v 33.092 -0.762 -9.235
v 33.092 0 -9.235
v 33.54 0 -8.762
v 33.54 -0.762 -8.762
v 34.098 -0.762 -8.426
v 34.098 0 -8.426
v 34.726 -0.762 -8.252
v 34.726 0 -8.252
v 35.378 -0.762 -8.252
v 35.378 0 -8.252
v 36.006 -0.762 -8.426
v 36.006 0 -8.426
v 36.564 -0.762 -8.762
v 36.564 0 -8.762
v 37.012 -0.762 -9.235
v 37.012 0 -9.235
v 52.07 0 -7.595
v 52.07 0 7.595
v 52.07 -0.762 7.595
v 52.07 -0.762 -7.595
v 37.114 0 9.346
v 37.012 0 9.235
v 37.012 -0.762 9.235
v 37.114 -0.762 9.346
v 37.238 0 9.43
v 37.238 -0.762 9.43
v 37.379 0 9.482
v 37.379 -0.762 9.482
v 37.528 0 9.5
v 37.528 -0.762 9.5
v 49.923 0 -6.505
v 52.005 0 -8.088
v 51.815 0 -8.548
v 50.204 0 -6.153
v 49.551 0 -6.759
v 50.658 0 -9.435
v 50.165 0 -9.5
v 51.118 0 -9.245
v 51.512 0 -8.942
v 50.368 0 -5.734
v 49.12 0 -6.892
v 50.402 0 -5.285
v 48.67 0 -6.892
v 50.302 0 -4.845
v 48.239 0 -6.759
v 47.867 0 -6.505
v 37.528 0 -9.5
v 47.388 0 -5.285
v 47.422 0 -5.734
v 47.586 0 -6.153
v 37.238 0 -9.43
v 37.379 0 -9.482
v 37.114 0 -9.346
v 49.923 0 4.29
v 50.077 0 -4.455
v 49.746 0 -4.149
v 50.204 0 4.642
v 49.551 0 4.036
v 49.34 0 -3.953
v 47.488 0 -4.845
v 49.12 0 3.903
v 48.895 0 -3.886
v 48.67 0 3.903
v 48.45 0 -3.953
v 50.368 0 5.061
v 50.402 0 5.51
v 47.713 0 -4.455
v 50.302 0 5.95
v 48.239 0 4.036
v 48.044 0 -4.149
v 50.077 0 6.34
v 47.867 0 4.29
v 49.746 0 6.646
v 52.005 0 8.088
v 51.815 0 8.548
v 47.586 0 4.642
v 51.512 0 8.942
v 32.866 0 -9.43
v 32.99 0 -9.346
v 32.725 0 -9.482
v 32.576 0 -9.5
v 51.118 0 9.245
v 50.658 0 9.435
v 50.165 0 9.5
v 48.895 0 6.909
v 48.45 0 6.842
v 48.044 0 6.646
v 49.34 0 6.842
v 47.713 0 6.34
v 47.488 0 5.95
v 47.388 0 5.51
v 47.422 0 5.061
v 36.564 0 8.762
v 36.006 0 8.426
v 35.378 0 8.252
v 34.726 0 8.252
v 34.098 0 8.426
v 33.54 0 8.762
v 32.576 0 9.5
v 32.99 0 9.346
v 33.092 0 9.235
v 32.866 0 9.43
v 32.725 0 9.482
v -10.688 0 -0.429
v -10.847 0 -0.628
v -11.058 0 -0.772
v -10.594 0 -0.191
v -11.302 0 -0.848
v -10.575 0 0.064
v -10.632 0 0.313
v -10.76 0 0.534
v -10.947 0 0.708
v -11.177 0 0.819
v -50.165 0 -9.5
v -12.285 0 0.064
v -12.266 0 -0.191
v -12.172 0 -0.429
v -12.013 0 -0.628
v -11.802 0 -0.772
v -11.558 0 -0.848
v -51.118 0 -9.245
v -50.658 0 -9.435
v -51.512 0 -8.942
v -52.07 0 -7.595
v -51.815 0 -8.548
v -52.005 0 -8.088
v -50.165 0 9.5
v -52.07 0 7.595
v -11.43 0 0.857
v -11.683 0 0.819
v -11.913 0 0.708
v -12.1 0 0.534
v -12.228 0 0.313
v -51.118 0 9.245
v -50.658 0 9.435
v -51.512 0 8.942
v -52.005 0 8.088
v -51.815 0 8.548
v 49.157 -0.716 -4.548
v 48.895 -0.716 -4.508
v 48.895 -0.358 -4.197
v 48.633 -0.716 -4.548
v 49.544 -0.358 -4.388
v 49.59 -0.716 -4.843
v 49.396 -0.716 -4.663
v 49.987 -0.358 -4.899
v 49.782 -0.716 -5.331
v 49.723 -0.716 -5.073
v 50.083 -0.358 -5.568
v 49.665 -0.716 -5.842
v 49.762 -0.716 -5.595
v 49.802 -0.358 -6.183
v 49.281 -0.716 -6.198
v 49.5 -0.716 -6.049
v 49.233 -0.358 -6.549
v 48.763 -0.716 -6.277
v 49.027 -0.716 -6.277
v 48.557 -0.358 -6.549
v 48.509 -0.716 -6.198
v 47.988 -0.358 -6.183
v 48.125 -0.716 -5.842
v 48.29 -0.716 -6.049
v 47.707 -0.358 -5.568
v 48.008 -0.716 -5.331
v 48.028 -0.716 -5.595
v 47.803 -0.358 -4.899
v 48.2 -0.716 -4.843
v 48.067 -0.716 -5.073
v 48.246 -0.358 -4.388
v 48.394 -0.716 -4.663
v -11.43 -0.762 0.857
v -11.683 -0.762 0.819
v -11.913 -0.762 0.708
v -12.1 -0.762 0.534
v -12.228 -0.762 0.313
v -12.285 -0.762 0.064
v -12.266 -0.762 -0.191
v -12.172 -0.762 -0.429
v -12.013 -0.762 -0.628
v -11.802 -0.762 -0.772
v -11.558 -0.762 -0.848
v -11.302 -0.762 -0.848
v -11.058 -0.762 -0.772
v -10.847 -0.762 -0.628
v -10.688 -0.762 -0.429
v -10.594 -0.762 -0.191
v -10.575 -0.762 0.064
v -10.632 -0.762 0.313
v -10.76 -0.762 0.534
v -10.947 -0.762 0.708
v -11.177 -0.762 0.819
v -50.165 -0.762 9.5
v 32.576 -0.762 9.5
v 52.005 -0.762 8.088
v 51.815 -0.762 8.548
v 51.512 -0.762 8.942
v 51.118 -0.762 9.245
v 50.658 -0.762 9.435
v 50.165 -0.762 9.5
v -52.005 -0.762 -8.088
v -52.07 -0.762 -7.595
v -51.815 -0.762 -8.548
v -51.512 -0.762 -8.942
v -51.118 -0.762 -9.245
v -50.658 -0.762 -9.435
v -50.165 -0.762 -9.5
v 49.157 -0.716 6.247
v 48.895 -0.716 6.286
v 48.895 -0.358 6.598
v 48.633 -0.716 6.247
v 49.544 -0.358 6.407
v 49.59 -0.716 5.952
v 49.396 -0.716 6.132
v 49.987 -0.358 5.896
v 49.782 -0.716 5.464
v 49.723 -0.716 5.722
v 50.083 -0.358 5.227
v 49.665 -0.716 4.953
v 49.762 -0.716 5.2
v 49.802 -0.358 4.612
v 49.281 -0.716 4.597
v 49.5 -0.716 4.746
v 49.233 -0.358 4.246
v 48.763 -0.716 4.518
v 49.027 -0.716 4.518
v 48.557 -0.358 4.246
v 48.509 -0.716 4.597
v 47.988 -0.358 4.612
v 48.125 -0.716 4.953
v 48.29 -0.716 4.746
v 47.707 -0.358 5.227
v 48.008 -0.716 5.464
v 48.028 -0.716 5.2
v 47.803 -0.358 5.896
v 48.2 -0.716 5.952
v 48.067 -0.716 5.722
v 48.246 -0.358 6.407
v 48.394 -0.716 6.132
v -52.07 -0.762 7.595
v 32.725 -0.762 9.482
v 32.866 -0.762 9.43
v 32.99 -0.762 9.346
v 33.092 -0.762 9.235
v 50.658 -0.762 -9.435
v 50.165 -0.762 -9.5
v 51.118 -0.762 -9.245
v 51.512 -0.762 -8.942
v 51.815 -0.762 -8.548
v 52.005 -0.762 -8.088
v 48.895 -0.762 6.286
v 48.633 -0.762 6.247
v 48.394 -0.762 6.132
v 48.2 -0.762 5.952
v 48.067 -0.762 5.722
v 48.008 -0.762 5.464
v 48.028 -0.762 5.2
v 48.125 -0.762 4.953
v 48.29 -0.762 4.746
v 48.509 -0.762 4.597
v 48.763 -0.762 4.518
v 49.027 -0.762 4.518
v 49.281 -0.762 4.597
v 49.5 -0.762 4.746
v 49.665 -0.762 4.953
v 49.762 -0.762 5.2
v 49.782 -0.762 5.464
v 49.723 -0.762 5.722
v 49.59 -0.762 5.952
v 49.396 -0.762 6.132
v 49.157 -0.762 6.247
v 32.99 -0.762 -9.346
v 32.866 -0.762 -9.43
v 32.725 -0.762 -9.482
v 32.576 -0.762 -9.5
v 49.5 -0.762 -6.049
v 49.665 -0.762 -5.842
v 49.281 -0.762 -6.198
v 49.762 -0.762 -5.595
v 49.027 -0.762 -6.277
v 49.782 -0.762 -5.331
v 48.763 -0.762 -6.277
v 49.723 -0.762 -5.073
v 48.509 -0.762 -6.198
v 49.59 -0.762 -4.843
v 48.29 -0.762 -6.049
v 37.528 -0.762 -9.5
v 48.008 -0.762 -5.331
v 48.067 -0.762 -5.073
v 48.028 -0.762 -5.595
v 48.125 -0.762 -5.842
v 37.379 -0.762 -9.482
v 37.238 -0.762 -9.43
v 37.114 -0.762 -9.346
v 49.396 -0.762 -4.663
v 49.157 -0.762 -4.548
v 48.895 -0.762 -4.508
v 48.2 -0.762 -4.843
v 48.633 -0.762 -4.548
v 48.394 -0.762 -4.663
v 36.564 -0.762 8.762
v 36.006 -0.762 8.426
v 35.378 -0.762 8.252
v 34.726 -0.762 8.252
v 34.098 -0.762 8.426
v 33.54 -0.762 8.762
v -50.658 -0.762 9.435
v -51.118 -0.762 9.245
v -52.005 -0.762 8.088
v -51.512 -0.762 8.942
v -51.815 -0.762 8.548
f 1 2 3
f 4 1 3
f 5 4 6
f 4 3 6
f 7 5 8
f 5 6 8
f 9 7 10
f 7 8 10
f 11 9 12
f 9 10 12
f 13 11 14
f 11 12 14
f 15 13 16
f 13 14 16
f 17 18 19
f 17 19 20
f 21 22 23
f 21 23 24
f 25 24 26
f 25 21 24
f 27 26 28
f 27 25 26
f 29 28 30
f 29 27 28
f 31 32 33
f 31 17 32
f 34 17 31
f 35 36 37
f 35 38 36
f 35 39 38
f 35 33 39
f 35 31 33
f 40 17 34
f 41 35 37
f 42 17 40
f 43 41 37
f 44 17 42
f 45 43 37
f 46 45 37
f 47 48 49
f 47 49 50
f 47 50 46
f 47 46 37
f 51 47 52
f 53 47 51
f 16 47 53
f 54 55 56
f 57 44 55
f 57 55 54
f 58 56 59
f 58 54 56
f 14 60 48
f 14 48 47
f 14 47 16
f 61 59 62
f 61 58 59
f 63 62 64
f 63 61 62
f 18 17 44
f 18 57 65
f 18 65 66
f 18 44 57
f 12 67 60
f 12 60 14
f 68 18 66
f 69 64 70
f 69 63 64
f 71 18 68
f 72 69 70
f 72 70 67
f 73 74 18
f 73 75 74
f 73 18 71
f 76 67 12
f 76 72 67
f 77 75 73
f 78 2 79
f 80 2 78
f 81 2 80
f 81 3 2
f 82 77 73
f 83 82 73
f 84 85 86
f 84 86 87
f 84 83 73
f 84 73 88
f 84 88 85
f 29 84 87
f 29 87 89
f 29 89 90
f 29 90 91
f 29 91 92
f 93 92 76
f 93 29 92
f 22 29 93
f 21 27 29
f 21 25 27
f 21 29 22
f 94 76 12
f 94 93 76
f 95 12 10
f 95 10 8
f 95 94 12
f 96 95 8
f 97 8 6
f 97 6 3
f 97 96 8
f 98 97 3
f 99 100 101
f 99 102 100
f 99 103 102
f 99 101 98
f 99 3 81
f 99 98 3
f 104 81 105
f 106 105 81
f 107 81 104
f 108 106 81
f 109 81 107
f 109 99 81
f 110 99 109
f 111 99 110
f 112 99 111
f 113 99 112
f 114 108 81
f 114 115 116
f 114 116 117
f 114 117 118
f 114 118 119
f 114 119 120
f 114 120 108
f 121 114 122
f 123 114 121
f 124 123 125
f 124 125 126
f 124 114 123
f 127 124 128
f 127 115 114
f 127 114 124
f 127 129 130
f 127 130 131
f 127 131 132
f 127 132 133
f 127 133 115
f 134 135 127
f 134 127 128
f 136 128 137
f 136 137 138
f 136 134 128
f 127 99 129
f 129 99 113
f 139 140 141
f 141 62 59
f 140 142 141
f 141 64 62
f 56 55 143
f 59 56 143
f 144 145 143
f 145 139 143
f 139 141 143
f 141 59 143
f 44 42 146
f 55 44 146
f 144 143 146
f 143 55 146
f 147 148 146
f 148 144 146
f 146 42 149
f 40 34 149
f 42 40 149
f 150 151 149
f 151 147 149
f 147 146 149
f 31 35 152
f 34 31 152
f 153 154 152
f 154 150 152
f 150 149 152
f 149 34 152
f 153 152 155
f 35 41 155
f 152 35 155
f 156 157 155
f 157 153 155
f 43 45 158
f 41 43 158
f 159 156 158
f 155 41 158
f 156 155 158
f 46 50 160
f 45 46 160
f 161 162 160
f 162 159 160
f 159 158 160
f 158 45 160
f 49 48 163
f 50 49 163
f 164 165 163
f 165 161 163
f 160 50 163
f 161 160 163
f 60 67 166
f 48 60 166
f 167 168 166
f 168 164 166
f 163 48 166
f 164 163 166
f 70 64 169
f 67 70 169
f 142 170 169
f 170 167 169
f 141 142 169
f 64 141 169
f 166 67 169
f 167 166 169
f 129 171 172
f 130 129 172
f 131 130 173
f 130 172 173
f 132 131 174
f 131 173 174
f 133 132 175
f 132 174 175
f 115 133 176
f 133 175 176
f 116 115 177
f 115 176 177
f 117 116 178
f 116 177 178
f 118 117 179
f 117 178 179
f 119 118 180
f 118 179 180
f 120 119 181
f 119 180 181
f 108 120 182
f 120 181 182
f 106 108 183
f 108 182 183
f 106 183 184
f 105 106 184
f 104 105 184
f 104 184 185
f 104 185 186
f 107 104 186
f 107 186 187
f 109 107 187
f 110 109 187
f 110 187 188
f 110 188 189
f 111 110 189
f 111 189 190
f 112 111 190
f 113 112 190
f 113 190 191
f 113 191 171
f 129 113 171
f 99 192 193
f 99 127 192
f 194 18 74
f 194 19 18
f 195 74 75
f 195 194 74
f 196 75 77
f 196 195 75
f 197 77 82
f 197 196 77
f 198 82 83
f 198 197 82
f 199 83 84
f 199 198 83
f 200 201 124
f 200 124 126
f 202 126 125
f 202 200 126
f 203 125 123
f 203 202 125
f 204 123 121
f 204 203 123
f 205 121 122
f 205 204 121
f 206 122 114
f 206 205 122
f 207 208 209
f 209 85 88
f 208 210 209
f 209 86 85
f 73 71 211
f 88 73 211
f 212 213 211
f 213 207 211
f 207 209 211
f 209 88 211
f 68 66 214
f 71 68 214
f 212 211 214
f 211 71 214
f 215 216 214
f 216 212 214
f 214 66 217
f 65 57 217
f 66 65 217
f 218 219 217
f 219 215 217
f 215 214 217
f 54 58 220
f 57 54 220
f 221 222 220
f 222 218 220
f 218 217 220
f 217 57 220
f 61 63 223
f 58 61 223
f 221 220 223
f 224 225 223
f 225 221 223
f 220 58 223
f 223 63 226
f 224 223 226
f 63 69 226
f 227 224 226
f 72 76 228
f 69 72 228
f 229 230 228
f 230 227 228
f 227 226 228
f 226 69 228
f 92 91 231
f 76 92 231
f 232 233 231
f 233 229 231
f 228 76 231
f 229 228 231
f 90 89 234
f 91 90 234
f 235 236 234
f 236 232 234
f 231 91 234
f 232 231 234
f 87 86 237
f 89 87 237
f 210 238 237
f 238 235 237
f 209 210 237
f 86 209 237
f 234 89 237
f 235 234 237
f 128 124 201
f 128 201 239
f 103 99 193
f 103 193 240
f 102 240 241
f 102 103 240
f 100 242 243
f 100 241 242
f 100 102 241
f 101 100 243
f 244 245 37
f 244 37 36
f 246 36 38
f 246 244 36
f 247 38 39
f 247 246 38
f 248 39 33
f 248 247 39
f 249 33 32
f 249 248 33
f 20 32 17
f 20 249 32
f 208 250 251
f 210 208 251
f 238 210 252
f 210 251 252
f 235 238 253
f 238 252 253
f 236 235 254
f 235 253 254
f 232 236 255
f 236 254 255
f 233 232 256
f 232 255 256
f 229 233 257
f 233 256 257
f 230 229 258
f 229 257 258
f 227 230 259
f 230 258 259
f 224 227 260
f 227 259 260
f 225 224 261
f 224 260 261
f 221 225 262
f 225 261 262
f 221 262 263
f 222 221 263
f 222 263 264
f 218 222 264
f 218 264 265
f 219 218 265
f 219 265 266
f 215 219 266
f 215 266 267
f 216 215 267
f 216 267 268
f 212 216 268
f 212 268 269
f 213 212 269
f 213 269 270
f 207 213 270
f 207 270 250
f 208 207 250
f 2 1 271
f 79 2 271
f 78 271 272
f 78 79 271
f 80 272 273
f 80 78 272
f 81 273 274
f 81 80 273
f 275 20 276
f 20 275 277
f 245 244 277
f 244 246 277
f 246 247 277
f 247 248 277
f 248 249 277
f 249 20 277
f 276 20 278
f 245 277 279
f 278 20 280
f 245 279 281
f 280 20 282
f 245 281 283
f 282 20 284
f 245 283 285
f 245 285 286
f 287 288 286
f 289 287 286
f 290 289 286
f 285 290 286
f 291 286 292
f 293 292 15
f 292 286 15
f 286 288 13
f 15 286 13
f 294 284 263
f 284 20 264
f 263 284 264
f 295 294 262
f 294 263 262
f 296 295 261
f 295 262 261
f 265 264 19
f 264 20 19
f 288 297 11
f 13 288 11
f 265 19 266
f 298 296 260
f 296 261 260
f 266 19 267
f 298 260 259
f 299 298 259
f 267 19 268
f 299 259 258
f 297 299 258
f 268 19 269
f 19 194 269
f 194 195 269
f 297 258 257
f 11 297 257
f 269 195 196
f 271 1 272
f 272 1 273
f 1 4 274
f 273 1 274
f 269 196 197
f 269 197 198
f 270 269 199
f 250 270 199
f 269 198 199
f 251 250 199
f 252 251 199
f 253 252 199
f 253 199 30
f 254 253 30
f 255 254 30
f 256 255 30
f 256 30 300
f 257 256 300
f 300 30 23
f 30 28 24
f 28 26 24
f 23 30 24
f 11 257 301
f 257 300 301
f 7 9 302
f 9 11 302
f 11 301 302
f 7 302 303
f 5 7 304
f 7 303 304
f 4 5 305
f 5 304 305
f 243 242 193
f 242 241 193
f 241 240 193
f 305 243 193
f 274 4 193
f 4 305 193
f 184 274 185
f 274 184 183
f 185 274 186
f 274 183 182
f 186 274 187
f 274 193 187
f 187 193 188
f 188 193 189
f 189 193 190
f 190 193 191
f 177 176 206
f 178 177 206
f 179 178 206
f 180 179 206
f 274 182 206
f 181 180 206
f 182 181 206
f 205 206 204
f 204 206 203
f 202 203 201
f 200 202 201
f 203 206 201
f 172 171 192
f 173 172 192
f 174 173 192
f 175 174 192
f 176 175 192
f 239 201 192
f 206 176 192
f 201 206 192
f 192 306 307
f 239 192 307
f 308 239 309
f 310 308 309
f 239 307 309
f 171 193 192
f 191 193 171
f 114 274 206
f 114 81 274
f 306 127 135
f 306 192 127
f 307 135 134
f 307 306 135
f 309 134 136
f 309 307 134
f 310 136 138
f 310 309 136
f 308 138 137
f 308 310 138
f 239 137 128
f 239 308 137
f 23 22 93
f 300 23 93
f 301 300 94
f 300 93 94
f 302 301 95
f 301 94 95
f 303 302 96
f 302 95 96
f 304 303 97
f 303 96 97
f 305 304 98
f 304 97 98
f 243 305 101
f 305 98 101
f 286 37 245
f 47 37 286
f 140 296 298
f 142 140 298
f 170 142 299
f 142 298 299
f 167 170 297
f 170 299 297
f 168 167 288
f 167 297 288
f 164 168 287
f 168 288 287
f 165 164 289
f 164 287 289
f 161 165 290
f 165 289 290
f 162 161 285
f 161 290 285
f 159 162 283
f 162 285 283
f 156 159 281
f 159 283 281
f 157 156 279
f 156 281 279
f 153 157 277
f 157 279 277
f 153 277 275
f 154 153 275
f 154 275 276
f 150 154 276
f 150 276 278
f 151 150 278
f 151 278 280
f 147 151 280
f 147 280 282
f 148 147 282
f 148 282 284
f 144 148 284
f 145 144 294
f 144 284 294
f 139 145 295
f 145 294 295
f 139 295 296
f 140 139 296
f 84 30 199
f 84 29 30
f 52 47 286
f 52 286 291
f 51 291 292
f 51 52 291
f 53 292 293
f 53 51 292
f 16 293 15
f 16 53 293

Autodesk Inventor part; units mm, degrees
ref_plane "YZ Plane" through (0, 0, 0) normal (1, 0, 0) x (0, 1, 0)
ref_plane "XZ Plane" through (0, 0, 0) normal (0, 1, 0) x (-1, 0, 0)
ref_plane "XY Plane" through (0, 0, 0) normal (0, 0, 1) x (1, 0, 0)
sketch "Sketch1" plane through (0, 0, 0) normal (0, 1, 0) x (-1, 0, 0)
  line L0 (0, -13.3) -> (0, 13.3) projected
  line L1 (-72.898, 0) -> (72.898, 0) projected
  line L2 (-52.07, -9.5) -> (52.07, -9.5)
  line L3 (52.07, -9.5) -> (52.07, 9.5)
  line L4 (52.07, 9.5) -> (-52.07, 9.5)
  line L5 (-52.07, 9.5) -> (-52.07, -9.5)
  line L6 (-52.07, -9.5) -> (52.07, 9.5) construction
  line L7 (52.07, -9.5) -> (-52.07, 9.5) construction
  point P0 (0, 0)
  point P1 (11.43, 0)
  point P2 (-48.895, 5.3975)
  point P3 (-48.895, -5.3975)
  dimension "d0" = 19
  dimension "d1" = 104.14
  dimension "d2" = 40.64
  dimension "d13" = 10.795
  dimension "d14" = 5.3975
  dimension "d15" = 3.175
extrude "Extrusion1" add sketch "Sketch1" against normal blind 0.762
hole "Hole1" at (-11.43, 0, 0) direction (0, -1, 0) diameter 1.7145 end through all
fillet "Fillet1" radius 1.905 4 edges at (-52.07, -0.381, 9.5) (-52.07, -0.381, -9.5) (52.07, -0.381, 9.5) (52.07, -0.381, -9.5)
hole "Hole2" at (48.895, 0, 5.3975) at (48.895, 0, -5.3975) direction (0, -1, 0) diameter 1.778 end through all countersink diameter 3.0226 countersink angle 82 clearance for "Flat Head Machine Screw (82)" size "#0" standard "Ansi Unified Screw Threads"
sketch "Sketch3" plane through (0, 0, 0) normal (0, 1, 0) x (-1, 0, 0)
  line L0 (0, -2.6111) -> (0, 15.6667) projected
  line L1 (-44.958, 0) -> (7.493, 0) projected
  circle A0 centre (-35.052, 10.6426) radius 2.413
  point P0 (0, 0)
  dimension "d26" = 4.826
  dimension "d27" = 35.052
  dimension "d28" = 10.6426
extrude "Extrusion2" cut sketch "Sketch3" against normal through all
mirror "Mirror2" about plane through (0, 0, 0) normal (0, 0, 1) of "Extrusion2"
fillet "Fillet2" radius 0.635 4 edges at (32.9267, -0.381, -9.5) (37.1773, -0.381, -9.5) (37.1773, -0.381, 9.5) (32.9267, -0.381, 9.5)
equation "\"d14\" = 0.5 * d13"
properties part number "J010356" material "POLYCARBONATE, CLEAR"
